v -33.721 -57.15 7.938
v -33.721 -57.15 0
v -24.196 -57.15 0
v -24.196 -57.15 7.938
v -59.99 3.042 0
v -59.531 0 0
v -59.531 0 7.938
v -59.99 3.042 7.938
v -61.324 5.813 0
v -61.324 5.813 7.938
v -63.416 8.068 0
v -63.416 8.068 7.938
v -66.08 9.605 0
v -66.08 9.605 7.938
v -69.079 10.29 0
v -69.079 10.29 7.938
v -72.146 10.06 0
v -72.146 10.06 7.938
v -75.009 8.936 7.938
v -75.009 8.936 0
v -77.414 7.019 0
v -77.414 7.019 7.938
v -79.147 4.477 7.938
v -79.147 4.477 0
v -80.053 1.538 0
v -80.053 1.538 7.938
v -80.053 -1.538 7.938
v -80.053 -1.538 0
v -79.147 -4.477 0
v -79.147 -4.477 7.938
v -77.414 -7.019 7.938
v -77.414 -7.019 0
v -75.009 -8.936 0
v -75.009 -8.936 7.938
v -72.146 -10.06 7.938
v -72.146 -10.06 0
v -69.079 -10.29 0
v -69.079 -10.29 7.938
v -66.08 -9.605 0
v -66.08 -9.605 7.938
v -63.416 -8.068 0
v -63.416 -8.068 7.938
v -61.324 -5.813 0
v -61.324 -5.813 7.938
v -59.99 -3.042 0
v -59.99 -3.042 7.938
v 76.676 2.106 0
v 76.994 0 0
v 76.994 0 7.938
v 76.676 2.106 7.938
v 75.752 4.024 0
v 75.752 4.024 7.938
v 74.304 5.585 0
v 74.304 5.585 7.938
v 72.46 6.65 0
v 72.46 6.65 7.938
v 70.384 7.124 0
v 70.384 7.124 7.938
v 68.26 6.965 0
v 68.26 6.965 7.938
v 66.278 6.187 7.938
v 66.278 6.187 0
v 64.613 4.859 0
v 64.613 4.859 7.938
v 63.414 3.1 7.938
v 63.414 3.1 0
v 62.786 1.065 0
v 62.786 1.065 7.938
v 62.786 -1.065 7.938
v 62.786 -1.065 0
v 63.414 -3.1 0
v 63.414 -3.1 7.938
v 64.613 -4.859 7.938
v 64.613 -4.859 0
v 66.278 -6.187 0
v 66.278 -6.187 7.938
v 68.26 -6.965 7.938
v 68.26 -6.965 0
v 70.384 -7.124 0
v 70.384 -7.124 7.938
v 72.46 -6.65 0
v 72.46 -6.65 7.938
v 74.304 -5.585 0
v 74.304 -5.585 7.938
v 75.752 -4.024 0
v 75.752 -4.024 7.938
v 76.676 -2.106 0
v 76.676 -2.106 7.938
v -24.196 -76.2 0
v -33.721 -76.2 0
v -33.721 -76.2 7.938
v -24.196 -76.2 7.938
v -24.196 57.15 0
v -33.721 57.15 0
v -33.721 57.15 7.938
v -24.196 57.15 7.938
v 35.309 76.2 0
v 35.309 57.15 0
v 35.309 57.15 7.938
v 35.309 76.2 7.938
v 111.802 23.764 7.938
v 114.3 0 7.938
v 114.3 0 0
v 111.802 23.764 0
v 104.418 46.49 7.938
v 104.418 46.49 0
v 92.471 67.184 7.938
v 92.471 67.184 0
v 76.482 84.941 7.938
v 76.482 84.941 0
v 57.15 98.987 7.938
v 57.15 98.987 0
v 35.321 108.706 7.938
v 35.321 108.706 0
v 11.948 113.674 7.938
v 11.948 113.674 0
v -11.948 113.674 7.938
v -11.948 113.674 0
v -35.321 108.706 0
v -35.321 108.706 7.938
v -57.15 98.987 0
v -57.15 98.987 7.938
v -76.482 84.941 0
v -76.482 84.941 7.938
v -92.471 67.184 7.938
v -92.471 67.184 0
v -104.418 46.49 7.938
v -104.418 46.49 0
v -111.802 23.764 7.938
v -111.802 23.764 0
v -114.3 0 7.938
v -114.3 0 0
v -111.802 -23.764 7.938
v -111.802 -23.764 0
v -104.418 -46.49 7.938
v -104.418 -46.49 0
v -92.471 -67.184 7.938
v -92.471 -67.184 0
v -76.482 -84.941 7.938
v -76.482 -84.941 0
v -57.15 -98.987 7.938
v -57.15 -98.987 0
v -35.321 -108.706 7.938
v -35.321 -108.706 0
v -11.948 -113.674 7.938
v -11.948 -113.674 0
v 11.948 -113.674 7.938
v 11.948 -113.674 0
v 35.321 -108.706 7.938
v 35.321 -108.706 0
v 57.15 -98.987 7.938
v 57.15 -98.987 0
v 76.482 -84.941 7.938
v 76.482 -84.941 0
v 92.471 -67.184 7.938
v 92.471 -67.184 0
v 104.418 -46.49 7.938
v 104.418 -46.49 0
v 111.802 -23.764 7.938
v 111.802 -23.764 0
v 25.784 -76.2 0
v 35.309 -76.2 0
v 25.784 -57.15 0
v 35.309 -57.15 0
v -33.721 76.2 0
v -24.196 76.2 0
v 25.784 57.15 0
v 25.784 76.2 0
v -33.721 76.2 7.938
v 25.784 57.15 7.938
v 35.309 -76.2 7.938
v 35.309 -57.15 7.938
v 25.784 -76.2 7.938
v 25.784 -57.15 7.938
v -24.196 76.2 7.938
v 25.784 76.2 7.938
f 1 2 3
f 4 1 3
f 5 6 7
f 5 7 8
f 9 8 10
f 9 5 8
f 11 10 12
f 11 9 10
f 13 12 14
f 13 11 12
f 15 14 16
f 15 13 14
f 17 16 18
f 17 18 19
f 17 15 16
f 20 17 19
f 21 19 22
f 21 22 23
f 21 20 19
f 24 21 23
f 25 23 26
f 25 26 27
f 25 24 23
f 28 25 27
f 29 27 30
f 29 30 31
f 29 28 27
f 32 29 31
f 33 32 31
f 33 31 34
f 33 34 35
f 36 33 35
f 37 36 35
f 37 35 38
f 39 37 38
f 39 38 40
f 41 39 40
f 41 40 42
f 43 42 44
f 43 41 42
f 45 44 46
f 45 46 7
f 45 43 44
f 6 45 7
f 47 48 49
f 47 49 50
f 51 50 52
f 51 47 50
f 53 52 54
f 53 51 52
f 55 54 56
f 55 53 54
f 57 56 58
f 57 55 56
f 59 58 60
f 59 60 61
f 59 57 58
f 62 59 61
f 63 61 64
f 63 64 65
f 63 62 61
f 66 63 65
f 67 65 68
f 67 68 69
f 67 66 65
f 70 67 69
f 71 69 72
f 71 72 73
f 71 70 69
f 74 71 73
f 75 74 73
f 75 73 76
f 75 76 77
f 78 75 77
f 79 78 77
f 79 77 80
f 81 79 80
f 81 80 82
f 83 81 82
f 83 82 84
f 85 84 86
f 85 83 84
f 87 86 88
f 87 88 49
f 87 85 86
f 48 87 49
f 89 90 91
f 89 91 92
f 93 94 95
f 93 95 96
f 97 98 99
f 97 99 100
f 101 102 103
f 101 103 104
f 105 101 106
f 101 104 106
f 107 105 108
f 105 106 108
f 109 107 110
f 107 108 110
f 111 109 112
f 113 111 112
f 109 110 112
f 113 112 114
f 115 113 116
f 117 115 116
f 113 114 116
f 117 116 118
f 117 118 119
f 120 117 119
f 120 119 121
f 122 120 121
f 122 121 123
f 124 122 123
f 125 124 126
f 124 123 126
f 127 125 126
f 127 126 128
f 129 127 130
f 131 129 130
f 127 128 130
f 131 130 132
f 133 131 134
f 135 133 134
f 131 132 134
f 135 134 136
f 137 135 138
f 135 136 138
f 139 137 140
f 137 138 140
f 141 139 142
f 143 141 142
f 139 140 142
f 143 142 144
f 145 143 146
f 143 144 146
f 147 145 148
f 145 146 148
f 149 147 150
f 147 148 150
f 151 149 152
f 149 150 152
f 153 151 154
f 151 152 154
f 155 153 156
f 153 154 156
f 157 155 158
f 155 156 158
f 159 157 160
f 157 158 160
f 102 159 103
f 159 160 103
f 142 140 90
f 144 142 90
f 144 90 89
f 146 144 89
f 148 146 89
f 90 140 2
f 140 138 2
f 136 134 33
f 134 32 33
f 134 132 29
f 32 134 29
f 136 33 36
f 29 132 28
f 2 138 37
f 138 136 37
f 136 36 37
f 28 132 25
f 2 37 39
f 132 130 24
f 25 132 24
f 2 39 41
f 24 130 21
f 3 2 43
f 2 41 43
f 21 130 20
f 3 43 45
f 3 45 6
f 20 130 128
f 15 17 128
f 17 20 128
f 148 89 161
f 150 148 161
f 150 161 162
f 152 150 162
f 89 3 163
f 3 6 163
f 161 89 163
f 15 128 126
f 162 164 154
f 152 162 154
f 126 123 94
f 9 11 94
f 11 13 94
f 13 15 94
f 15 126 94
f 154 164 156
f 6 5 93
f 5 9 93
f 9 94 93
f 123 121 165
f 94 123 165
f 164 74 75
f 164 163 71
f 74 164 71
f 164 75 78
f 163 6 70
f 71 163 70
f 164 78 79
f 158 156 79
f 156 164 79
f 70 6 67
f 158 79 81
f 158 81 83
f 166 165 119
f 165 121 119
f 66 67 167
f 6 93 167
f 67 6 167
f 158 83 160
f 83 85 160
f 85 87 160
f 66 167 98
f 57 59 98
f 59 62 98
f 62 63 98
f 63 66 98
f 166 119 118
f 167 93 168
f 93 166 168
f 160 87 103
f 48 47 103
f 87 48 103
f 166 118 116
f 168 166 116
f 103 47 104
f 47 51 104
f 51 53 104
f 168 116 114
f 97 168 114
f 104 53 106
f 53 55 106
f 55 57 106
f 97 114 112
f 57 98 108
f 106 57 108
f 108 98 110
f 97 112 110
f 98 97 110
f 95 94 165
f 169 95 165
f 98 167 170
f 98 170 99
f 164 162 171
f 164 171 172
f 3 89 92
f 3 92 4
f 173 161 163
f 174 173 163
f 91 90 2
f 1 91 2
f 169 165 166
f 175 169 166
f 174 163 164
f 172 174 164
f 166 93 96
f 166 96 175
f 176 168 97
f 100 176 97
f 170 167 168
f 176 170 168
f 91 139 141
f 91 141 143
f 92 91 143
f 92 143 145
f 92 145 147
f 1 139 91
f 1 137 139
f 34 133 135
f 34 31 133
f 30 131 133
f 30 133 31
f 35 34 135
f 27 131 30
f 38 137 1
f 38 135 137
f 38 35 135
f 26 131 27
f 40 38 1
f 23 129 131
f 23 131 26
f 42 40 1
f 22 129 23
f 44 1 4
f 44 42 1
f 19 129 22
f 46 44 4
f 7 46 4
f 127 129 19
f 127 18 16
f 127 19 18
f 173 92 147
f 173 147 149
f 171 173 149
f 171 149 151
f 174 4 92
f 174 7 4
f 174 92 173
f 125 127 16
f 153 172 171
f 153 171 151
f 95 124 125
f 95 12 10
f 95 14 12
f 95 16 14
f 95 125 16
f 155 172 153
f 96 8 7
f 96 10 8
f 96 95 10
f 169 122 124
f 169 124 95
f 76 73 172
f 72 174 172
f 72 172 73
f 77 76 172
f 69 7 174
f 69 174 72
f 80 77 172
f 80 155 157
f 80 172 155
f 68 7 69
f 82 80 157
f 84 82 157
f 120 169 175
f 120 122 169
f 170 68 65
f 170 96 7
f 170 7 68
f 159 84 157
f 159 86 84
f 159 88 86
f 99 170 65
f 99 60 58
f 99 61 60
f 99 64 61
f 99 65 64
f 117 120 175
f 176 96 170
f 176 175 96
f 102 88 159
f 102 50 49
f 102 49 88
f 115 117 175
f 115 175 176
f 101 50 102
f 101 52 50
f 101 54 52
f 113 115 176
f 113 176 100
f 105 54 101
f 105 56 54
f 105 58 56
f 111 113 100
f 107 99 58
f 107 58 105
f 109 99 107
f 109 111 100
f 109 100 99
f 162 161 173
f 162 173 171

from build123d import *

# Parameters (mm, degrees)
F0_R     = 114.3
F0_W     = 9.525
F0_H     = 19.05
F0_R_2   = 10.31875
F0_R_3   = 7.14375
F1_DEPTH = 7.9375


# Not quite as in the source:
# - a length typed as a fraction of an inch, garbled in the dataset ("3 / 203.2 mm" for 3/8 in), is restored


with BuildPart() as f1:
    # F0 (on Top) → F1 (new body)
    with BuildSketch(Plane.XY):
        Circle(F0_R)
        with Locations((-28.9588448, -66.675)):
            Rectangle(F0_W, F0_H, mode=Mode.SUBTRACT)
        with Locations((30.5463448, -66.675)):
            Rectangle(F0_W, F0_H, mode=Mode.SUBTRACT)
        with Locations((-69.85, 0)):
            Circle(F0_R_2, mode=Mode.SUBTRACT)
        with Locations((-28.9588448, 66.675)):
            Rectangle(F0_W, F0_H, mode=Mode.SUBTRACT)
        with Locations((69.85, 0)):
            Circle(F0_R_3, mode=Mode.SUBTRACT)
        with Locations((30.5463448, 66.675)):
            Rectangle(F0_W, F0_H, mode=Mode.SUBTRACT)
    extrude(amount=F1_DEPTH)


solid = f1.part
